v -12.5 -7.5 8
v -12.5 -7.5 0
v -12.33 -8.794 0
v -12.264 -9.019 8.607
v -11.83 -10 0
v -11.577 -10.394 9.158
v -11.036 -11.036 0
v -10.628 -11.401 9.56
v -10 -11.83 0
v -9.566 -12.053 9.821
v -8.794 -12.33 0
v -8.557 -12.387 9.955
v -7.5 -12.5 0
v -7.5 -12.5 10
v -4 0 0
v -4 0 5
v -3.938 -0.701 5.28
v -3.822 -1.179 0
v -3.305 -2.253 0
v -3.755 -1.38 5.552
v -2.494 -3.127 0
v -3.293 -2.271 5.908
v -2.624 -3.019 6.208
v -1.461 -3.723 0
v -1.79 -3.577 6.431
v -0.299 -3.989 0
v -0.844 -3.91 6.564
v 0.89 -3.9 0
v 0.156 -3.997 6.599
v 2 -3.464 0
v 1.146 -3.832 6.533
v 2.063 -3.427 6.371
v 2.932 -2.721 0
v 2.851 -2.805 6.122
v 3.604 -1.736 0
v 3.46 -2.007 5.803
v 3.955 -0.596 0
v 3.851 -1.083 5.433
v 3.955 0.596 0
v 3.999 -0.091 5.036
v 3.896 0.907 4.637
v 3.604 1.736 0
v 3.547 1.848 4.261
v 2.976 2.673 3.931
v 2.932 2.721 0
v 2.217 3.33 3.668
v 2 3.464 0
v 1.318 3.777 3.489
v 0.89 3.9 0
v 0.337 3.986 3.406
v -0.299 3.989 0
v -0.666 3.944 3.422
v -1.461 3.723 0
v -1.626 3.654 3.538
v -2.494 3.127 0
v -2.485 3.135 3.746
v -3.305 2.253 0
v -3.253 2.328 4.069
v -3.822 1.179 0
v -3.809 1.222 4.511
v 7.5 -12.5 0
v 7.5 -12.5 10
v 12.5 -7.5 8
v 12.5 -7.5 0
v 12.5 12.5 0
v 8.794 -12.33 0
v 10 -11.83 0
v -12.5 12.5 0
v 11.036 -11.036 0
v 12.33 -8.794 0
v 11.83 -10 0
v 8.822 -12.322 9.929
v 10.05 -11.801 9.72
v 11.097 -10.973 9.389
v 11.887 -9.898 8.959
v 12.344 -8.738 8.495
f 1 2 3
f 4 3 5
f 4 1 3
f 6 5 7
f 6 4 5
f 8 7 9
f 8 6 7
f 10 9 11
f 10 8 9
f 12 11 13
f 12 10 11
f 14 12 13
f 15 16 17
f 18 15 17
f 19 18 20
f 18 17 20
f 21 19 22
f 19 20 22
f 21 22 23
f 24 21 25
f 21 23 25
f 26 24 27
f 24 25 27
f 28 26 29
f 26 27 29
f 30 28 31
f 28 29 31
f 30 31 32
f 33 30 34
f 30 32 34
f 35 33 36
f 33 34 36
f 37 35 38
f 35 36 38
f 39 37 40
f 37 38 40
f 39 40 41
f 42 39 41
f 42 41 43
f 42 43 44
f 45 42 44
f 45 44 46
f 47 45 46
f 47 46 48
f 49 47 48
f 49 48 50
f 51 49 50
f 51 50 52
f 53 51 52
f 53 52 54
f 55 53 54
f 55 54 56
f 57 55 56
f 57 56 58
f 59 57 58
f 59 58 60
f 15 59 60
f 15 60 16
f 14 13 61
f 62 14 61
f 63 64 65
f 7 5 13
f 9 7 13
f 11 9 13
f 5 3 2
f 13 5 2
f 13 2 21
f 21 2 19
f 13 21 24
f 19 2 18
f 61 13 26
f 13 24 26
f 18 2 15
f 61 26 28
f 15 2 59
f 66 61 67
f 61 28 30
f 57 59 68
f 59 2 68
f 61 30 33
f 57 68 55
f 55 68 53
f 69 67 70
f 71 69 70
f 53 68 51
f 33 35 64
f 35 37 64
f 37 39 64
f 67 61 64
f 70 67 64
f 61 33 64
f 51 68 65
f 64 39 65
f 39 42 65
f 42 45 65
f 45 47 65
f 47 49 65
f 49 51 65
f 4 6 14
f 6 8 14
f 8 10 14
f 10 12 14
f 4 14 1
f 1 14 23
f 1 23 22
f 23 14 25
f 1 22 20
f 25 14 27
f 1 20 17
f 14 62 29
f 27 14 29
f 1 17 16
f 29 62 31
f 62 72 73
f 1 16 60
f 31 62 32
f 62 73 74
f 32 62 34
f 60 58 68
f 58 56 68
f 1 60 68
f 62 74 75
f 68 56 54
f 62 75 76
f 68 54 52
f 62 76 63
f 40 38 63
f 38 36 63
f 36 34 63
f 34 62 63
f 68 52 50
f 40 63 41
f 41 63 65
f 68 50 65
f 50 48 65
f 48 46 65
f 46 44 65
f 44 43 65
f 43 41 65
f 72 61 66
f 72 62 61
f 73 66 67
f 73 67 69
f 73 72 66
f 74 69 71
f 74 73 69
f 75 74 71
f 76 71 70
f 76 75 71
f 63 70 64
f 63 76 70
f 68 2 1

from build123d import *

# Parameters (mm, degrees)
F0_W     = 25
F0_H     = 25
F1_DEPTH = 10
F3_DEPTH = 25
F5_D     = 8
F5_DEPTH = 30
F6_R     = 5


with BuildPart() as f1:
    # F0 (on Top) → F1 (new body)
    with BuildSketch(Plane.XY):
        Rectangle(F0_W, F0_H)
    extrude(amount=F1_DEPTH)

    # F2 (on face) → F3 (cut)
    with BuildSketch(Plane.YZ.offset(12.5)):
        Polygon((12.5, 10), (-12.5, 10), (12.5, 0), align=None)
    extrude(amount=-F3_DEPTH, mode=Mode.SUBTRACT)

    # F5
    with Locations(Plane(origin=(0, 0, 0), x_dir=(1, 0, 0), z_dir=(0, 0, -1))):
        with Locations((0, 0)):
            Hole(F5_D / 2, depth=F5_DEPTH)

    # F6
    f6_edges = [f1.edges().sort_by_distance(p)[0] for p in [
        (12.5, -12.5, 5),
        (-12.5, -12.5, 5),
    ]]
    fillet(f6_edges, radius=F6_R)


solid = f1.part
